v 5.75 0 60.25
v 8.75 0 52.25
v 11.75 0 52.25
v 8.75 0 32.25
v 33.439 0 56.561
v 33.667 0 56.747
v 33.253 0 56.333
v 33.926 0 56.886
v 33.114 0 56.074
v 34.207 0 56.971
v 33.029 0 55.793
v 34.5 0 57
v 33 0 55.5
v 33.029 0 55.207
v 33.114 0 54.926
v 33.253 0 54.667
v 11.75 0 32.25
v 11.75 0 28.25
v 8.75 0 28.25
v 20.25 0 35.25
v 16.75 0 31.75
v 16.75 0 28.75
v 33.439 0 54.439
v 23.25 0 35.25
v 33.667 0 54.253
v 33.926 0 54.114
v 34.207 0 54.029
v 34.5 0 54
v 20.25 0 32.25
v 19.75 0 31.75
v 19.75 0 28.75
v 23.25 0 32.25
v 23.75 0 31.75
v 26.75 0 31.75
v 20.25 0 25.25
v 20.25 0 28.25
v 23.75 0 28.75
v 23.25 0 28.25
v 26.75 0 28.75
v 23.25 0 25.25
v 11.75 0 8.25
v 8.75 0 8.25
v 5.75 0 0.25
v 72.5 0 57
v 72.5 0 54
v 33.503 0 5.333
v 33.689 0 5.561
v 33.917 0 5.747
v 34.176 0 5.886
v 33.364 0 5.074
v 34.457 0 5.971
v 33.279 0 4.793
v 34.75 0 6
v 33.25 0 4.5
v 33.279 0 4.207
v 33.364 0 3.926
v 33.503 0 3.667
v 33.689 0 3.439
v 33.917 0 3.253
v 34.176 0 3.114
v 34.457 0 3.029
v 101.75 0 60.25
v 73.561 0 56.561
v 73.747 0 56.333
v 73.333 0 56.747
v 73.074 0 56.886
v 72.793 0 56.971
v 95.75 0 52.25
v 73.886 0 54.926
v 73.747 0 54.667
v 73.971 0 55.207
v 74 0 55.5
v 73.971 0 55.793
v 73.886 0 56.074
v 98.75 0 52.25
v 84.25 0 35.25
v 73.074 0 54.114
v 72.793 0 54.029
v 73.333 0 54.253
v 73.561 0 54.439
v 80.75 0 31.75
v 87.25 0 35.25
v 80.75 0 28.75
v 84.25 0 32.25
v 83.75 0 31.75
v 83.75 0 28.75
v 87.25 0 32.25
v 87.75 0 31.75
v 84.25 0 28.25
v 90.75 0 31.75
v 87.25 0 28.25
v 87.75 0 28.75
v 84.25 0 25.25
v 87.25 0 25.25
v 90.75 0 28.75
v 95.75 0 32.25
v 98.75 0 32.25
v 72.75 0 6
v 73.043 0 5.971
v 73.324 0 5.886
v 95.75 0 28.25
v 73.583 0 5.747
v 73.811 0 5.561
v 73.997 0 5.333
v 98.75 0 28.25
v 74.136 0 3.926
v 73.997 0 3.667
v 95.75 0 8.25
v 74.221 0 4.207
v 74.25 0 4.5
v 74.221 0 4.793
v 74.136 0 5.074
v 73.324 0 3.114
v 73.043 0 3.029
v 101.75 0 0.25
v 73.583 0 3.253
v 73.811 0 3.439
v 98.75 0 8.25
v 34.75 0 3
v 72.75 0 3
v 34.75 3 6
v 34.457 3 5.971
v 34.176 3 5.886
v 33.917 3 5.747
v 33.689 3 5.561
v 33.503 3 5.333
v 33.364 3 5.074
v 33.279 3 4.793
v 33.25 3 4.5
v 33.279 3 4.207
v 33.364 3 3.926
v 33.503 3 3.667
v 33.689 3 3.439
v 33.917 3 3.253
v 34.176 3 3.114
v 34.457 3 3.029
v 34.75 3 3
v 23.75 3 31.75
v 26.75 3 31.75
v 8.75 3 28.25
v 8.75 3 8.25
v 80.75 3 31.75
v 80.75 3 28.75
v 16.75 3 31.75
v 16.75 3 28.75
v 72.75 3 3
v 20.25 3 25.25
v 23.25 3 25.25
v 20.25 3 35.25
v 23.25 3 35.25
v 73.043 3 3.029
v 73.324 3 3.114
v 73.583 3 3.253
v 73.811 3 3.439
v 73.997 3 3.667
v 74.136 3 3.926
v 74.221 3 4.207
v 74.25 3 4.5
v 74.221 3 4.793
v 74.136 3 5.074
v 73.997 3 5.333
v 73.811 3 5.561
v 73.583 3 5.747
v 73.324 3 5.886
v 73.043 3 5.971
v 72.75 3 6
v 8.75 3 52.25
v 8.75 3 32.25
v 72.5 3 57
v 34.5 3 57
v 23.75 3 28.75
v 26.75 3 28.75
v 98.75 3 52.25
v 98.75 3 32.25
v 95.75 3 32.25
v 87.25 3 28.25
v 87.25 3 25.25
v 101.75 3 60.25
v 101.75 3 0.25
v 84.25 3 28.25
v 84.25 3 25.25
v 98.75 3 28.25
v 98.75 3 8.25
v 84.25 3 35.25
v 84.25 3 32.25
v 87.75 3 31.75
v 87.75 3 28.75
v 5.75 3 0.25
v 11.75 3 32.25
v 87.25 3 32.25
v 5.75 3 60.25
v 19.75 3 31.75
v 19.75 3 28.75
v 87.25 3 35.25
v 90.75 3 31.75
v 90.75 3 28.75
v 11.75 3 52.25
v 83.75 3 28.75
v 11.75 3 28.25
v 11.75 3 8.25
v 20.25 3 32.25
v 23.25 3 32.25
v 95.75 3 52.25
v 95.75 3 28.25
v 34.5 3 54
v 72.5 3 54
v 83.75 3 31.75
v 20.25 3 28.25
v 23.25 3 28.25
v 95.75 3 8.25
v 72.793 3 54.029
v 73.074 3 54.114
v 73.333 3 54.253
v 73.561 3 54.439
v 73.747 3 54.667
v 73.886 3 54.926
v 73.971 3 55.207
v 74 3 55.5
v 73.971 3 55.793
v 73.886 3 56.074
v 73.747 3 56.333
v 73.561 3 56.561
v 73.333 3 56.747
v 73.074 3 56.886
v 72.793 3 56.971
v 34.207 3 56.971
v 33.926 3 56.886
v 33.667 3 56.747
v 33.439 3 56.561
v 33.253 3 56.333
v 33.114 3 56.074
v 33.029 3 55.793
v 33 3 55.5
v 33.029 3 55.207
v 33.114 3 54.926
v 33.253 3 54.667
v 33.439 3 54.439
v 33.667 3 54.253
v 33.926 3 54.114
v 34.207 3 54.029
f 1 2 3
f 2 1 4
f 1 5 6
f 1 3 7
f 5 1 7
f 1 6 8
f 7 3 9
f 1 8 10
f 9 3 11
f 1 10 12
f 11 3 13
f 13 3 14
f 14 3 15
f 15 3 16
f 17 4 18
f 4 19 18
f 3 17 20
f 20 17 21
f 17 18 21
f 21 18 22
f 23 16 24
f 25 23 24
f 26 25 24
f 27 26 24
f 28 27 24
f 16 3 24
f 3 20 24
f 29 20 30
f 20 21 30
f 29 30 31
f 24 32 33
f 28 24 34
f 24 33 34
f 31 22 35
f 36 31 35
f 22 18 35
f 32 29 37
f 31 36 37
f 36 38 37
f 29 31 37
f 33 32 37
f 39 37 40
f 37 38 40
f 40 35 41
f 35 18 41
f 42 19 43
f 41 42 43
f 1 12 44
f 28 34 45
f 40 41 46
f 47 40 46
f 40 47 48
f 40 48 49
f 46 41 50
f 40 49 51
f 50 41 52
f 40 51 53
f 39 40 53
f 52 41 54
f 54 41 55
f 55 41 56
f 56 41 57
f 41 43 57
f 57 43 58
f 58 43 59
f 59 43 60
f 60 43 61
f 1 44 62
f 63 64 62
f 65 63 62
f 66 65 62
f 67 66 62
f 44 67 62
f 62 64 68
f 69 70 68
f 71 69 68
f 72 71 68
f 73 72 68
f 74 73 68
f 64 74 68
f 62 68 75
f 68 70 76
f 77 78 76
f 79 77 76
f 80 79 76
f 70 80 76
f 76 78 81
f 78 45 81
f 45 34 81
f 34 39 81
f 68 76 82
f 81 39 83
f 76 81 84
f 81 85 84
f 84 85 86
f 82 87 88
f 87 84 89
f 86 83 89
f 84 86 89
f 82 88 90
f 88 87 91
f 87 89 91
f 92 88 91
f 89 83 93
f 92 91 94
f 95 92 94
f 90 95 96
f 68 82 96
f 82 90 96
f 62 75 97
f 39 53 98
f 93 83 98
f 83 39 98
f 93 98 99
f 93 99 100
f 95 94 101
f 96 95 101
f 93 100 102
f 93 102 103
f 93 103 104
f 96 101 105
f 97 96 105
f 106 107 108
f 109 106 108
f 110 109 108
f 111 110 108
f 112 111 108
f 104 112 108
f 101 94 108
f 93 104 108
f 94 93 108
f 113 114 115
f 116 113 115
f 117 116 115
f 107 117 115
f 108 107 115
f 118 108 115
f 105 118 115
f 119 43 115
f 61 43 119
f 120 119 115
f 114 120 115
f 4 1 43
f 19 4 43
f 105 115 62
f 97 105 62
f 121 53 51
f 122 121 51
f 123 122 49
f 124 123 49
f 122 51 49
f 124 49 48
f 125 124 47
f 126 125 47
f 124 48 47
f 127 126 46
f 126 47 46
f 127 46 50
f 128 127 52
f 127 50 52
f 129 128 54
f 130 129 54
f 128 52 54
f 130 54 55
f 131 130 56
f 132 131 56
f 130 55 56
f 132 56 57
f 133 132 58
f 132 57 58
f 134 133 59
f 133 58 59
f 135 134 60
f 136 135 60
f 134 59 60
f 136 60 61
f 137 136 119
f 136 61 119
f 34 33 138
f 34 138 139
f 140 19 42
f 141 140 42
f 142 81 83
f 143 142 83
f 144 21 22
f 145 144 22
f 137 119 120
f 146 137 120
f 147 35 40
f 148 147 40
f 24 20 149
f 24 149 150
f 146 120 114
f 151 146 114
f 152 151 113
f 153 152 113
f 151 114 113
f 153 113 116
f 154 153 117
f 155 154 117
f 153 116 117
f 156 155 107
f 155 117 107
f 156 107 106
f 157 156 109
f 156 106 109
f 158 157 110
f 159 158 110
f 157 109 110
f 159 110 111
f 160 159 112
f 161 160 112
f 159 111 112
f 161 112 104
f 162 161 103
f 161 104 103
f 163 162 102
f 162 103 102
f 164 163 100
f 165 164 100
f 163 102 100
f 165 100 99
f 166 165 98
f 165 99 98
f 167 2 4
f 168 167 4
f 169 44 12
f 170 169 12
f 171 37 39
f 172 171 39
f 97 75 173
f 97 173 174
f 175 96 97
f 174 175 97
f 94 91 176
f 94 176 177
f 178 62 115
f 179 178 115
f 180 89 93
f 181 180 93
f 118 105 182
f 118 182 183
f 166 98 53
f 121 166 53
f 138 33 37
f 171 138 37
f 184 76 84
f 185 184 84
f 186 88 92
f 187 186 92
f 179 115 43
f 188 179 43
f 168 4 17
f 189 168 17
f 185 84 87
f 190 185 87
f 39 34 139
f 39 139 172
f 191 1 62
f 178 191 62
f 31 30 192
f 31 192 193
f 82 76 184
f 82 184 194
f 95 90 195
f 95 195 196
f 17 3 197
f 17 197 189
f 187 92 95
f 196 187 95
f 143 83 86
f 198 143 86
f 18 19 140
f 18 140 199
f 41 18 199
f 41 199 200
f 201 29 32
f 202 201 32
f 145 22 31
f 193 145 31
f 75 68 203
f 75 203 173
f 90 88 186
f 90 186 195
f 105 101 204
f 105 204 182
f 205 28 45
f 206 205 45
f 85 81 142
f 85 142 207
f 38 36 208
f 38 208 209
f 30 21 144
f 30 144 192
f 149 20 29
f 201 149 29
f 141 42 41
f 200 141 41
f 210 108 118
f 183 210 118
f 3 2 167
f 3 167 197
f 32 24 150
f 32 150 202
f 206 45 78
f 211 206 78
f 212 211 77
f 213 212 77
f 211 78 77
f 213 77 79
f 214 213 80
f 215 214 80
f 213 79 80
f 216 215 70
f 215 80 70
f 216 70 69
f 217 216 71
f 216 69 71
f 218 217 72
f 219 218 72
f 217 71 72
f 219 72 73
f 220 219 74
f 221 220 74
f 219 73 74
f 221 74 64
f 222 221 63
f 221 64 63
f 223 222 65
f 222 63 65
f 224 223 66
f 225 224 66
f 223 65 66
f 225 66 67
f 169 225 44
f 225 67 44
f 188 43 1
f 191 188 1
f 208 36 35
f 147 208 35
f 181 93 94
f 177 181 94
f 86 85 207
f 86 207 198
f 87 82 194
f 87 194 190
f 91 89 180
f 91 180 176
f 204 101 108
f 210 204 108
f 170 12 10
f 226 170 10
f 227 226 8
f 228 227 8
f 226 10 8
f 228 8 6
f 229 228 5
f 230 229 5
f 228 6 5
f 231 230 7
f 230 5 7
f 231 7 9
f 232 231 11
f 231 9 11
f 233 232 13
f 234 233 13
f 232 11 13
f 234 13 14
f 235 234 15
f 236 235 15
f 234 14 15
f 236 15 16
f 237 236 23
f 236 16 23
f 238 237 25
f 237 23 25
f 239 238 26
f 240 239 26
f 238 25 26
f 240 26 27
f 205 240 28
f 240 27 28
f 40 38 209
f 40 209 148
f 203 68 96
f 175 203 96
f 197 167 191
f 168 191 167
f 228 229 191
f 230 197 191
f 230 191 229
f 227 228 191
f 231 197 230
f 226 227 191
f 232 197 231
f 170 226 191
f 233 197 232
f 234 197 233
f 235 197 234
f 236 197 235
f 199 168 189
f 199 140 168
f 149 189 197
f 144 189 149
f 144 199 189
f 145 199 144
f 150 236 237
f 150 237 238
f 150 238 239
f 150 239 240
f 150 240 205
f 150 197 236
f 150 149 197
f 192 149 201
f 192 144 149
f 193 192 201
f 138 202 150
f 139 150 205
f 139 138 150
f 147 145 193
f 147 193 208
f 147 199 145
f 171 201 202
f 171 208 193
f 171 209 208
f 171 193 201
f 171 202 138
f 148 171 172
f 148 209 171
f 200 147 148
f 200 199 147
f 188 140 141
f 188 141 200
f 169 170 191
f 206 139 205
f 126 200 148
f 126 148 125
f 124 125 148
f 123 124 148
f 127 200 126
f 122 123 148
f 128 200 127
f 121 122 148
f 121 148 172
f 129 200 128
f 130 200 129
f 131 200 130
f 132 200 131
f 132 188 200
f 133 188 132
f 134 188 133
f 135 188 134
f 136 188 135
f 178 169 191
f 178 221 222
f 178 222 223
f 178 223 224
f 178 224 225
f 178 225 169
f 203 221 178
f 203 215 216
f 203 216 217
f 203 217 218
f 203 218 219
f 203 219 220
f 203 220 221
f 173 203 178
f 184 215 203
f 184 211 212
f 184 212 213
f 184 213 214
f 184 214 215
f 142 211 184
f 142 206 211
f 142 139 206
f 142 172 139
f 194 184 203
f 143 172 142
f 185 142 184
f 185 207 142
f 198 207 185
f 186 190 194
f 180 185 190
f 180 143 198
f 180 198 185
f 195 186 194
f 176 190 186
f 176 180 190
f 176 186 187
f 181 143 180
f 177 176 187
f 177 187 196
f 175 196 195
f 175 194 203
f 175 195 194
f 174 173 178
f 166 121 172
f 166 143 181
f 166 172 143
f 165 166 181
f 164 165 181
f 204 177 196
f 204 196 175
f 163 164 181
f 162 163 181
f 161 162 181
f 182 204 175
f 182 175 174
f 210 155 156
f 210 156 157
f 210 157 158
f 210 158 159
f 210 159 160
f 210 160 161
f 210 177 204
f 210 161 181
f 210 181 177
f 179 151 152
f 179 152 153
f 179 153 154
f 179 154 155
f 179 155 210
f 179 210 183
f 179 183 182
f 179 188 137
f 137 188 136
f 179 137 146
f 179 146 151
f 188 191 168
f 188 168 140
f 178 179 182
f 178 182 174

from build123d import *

# Parameters (mm, degrees)
SKETCH_1_W      = 3
SKETCH_1_H      = 20
SKETCH_1_H_2    = 3
EXTRUDE_2_DEPTH = 3


with BuildPart() as part:
    # 草图1 → 凸台-拉伸2 (new body)
    with BuildSketch(Plane(origin=(0, 0, 0), x_dir=(1, 0, 0), z_dir=(0, 1, 0))):
        Polygon((101.75, -0.25), (53.75, -0.25), (5.75, -0.25), (5.75, -60.25), (101.75, -60.25), align=None)
        with BuildLine():
            Line((34.5, -54), (53.75, -54))
            Line((53.75, -54), (72.5, -54))
            ThreePointArc((72.5, -54), (74, -55.5), (72.5, -57))
            Line((72.5, -57), (53.75, -57))
            Line((53.75, -57), (34.5, -57))
            ThreePointArc((34.5, -57), (33, -55.5), (34.5, -54))
        make_face(mode=Mode.SUBTRACT)
        with Locations((10.25, -42.25)):
            Rectangle(SKETCH_1_W, SKETCH_1_H, mode=Mode.SUBTRACT)
        with Locations((18.25, -30.25)):
            Rectangle(SKETCH_1_W, SKETCH_1_H_2, mode=Mode.SUBTRACT)
        with Locations((21.75, -33.75)):
            Rectangle(SKETCH_1_W, SKETCH_1_H_2, mode=Mode.SUBTRACT)
        with Locations((25.25, -30.25)):
            Rectangle(SKETCH_1_W, SKETCH_1_H_2, mode=Mode.SUBTRACT)
        with Locations((97.25, -42.25)):
            Rectangle(SKETCH_1_W, SKETCH_1_H, mode=Mode.SUBTRACT)
        with Locations((85.75, -33.75)):
            Rectangle(SKETCH_1_W, SKETCH_1_H_2, mode=Mode.SUBTRACT)
        with Locations((82.25, -30.25)):
            Rectangle(SKETCH_1_W, SKETCH_1_H_2, mode=Mode.SUBTRACT)
        with Locations((89.25, -30.25)):
            Rectangle(SKETCH_1_W, SKETCH_1_H_2, mode=Mode.SUBTRACT)
        with Locations((21.75, -26.75)):
            Rectangle(SKETCH_1_W, SKETCH_1_H_2, mode=Mode.SUBTRACT)
        with Locations((10.25, -18.25)):
            Rectangle(SKETCH_1_W, SKETCH_1_H, mode=Mode.SUBTRACT)
        with Locations((85.75, -26.75)):
            Rectangle(SKETCH_1_W, SKETCH_1_H_2, mode=Mode.SUBTRACT)
        with Locations((97.25, -18.25)):
            Rectangle(SKETCH_1_W, SKETCH_1_H, mode=Mode.SUBTRACT)
        with BuildLine():
            Line((34.75, -3), (53.75, -3))
            Line((53.75, -3), (72.75, -3))
            ThreePointArc((72.75, -3), (74.25, -4.5), (72.75, -6))
            Line((72.75, -6), (53.75, -6))
            Line((53.75, -6), (34.75, -6))
            ThreePointArc((34.75, -6), (33.25, -4.5), (34.75, -3))
        make_face(mode=Mode.SUBTRACT)
    extrude(amount=EXTRUDE_2_DEPTH)


solid = part.part
